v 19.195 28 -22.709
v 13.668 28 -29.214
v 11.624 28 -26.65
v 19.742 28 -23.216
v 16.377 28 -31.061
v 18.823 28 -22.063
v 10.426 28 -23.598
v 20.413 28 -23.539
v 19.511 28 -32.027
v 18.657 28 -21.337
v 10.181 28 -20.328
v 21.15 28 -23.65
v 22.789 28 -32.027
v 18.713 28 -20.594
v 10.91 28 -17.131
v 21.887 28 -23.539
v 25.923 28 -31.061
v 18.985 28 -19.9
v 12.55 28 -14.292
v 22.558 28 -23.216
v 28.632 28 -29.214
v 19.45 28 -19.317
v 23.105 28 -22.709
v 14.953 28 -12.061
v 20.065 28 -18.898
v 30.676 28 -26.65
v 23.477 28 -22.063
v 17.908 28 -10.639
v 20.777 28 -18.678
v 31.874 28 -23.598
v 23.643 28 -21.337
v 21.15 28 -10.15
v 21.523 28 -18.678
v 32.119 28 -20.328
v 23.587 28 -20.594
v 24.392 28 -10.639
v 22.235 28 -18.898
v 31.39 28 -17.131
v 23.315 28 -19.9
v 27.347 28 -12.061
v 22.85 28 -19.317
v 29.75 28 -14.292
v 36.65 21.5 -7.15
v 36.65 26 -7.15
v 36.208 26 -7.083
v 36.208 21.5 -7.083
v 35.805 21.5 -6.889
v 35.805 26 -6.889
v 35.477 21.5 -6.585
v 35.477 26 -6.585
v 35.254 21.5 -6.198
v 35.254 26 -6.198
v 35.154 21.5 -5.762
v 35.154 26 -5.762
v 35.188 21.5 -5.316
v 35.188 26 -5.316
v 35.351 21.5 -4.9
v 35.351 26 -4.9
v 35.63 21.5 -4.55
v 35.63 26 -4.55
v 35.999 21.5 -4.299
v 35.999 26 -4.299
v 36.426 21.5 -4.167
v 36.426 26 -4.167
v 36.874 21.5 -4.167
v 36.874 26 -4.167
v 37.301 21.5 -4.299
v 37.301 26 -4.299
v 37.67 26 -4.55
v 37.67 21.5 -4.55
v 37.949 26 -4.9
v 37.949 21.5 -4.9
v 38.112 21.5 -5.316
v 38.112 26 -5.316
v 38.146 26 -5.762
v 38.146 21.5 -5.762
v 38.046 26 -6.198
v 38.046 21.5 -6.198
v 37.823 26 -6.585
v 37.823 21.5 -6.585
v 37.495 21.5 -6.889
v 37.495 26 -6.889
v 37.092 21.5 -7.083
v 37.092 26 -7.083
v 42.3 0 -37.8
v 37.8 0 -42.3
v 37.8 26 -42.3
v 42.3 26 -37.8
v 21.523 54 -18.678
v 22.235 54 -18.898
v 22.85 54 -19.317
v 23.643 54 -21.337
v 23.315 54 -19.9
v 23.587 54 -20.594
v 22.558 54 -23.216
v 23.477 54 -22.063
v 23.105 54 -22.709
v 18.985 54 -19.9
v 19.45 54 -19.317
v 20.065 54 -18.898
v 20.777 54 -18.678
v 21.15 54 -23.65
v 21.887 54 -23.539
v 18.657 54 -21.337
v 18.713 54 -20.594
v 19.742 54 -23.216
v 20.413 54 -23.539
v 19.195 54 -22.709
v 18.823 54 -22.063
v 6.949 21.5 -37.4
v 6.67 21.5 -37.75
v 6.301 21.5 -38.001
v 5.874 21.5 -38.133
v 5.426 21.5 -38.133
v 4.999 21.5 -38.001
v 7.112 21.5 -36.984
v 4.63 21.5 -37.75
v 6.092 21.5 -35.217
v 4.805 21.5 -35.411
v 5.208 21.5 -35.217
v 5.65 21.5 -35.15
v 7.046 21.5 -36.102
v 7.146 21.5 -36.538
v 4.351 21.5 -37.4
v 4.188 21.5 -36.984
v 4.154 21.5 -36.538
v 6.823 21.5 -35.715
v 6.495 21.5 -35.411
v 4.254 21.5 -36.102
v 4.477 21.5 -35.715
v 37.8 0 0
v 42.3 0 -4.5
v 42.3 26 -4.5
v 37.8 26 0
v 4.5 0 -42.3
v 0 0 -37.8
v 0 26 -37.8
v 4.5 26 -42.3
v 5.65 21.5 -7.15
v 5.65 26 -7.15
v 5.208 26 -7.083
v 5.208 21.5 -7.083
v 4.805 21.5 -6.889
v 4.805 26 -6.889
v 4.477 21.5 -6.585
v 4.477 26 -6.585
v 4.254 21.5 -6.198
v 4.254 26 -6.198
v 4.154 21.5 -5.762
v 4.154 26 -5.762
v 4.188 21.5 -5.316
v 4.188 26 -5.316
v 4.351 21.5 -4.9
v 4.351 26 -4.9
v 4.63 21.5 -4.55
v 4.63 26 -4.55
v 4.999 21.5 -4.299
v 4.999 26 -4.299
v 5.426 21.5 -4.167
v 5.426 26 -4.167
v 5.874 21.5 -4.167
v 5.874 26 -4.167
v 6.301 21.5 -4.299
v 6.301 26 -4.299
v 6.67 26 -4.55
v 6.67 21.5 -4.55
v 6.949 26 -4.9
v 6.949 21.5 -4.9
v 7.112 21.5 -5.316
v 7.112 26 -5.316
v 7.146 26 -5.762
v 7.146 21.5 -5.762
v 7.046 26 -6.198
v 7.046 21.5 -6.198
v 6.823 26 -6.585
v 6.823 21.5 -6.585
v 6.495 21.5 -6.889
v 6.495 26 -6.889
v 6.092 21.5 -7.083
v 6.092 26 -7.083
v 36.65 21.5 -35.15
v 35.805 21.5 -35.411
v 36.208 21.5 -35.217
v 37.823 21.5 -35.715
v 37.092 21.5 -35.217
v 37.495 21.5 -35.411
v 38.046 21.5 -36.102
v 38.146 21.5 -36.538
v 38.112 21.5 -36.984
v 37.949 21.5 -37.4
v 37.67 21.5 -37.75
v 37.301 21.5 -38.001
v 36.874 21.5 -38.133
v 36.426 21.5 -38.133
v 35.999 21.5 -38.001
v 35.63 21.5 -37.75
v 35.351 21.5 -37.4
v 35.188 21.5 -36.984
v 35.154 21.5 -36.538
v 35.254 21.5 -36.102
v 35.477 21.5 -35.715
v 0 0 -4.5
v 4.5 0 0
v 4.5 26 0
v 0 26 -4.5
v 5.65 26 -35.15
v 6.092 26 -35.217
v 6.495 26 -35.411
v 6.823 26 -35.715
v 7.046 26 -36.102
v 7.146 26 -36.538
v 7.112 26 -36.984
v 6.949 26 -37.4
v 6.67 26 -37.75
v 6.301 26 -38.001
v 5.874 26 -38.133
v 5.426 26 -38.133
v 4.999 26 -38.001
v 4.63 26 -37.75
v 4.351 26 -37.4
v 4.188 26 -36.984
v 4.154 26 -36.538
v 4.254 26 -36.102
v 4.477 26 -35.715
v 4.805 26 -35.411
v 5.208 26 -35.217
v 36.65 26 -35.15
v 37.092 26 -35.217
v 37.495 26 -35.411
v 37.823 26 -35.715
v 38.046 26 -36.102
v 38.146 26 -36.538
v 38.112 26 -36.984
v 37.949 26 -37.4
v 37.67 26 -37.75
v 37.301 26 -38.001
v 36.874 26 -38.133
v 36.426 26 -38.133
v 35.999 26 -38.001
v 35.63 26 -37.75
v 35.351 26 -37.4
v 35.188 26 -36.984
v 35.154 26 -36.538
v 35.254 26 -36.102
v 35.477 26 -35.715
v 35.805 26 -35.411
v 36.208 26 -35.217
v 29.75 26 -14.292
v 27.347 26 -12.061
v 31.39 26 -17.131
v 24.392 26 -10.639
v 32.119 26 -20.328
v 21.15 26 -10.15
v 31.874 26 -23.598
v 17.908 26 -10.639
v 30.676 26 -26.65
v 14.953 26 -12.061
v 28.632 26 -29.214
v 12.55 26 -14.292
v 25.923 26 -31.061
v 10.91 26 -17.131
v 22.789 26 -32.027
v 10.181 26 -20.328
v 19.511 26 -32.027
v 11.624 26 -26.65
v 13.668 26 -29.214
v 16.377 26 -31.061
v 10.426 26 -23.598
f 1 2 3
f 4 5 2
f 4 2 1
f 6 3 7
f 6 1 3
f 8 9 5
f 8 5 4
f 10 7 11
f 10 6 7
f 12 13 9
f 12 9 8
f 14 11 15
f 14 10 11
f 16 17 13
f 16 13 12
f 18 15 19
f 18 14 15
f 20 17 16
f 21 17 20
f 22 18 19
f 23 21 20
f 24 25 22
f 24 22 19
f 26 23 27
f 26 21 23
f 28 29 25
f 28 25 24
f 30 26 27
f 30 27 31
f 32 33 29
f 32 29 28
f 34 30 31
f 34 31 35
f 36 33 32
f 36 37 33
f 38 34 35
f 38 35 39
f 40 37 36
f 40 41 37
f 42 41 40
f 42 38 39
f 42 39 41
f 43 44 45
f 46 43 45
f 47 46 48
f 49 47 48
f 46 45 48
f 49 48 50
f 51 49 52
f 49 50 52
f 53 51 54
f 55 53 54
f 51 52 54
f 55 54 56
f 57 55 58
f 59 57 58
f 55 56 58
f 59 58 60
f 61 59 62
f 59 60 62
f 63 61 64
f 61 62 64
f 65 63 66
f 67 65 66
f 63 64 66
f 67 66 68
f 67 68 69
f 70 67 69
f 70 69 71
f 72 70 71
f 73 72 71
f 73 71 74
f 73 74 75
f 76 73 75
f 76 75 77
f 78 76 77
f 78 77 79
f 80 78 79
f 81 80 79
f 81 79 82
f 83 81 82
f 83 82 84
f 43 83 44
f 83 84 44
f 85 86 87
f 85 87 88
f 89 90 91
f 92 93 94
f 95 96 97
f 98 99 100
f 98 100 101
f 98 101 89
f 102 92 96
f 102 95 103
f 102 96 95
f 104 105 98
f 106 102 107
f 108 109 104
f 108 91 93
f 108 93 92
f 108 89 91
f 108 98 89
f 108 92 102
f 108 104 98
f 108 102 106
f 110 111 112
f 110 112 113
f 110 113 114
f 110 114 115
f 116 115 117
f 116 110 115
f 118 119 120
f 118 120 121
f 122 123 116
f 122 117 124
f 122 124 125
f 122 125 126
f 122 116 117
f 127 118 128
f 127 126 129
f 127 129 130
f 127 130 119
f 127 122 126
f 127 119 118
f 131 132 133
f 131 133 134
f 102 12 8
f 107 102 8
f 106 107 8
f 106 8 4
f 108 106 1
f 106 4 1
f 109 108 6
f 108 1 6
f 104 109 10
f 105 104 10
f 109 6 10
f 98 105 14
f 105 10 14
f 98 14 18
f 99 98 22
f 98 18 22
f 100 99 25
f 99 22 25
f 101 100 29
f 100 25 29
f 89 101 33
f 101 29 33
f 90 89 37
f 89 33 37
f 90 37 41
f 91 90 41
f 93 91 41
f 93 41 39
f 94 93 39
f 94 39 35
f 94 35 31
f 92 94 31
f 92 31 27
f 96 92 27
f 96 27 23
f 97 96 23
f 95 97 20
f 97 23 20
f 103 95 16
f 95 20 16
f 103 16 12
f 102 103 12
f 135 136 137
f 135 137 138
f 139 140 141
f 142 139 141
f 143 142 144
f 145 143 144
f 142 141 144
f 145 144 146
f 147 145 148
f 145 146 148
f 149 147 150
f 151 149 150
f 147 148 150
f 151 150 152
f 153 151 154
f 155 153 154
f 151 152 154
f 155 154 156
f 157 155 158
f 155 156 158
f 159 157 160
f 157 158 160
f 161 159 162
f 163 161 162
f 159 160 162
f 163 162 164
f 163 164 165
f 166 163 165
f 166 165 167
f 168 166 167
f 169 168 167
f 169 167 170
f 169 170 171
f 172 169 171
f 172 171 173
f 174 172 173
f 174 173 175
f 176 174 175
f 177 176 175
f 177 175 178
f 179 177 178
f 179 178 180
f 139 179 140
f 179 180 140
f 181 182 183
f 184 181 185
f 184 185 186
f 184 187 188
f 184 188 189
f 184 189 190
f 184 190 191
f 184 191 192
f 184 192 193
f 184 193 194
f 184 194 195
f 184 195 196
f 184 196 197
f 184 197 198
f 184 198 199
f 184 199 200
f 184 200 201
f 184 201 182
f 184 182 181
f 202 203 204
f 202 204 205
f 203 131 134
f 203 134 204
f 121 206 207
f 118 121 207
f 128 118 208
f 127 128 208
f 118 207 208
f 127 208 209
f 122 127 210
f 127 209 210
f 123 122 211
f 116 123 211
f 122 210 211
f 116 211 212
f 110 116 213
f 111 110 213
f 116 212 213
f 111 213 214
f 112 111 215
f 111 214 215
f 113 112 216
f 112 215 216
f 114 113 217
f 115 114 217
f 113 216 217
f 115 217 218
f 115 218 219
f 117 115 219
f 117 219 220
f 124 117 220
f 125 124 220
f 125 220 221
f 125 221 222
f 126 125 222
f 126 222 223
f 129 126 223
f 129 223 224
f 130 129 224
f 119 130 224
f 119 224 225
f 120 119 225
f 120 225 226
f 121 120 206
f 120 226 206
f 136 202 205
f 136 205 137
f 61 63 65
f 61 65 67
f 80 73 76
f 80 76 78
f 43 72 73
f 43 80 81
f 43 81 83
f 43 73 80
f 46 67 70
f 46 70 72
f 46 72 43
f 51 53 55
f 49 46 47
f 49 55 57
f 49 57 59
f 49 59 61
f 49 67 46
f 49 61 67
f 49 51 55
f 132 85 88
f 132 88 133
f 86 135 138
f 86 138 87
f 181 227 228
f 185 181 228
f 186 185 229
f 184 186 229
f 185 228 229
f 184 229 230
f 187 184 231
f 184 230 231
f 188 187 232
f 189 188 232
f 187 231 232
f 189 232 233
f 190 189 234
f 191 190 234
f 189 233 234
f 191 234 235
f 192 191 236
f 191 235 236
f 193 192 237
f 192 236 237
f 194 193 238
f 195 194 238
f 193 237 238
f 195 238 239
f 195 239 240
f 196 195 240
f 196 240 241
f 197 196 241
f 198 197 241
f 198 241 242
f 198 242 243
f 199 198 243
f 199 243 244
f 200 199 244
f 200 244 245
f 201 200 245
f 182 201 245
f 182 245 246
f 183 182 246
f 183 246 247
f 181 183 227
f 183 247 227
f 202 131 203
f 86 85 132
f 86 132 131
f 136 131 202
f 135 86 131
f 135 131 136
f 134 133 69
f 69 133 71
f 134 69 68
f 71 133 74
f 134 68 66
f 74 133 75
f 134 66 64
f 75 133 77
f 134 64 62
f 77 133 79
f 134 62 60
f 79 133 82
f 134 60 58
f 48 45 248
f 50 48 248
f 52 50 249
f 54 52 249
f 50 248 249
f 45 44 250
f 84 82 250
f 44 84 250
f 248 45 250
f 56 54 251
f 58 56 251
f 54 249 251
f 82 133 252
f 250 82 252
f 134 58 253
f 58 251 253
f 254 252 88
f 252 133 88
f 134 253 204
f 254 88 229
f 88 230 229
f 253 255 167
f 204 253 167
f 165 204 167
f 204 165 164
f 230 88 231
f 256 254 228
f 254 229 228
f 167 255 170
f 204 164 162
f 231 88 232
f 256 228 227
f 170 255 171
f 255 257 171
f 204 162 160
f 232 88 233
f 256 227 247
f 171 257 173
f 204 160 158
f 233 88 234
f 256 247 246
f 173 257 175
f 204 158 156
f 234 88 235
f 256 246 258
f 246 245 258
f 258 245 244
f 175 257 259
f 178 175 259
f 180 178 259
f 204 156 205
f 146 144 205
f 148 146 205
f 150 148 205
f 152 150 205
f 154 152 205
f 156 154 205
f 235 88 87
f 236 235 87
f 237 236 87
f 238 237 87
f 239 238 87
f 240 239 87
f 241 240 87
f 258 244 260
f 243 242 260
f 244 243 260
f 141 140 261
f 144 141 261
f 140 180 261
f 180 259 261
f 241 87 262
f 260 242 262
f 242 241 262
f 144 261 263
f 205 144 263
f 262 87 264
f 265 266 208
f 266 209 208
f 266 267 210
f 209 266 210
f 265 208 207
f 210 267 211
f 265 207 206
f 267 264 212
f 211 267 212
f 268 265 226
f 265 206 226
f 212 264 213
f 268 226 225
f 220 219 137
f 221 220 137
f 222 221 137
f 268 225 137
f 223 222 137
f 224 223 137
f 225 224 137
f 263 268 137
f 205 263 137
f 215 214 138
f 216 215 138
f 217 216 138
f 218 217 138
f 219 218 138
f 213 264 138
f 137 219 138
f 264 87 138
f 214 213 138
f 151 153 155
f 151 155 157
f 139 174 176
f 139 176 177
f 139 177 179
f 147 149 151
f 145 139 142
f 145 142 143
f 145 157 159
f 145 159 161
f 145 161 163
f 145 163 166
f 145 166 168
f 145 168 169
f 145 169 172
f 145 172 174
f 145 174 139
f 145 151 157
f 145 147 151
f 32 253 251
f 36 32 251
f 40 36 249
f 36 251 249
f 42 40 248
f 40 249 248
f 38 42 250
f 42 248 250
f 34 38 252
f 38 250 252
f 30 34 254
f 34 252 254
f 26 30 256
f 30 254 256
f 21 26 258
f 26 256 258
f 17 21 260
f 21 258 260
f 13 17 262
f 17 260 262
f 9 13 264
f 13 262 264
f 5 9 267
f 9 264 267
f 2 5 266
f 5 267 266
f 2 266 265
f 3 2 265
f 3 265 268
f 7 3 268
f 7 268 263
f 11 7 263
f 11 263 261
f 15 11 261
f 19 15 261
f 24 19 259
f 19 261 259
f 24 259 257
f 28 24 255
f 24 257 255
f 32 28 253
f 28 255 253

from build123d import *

# Parameters (mm, degrees)
AUFSATZ_LINEAR_AUSTRAGEN1_DEPTH = 26
SKIZZE2_R                       = 11
AUFSATZ_LINEAR_AUSTRAGEN2_DEPTH = 2
SKIZZE3_R                       = 2.5
AUFSATZ_LINEAR_AUSTRAGEN3_DEPTH = 26
SKIZZE4_R                       = 1.5
SCHNITT_LINEAR_AUSTRAGEN1_DEPTH = 4.5


with BuildPart() as part:
    # Skizze1 → Aufsatz-Linear austragen1 (new body)
    with BuildSketch(Plane(origin=(0, 0, 0), x_dir=(1, 0, 0), z_dir=(0, 1, 0))):
        Polygon((0, 37.8), (4.5, 42.3), (37.8, 42.3), (42.3, 37.8), (42.3, 4.5), (37.8, 0), (4.5, 0), (0, 4.5), align=None)
    extrude(amount=AUFSATZ_LINEAR_AUSTRAGEN1_DEPTH)

    # Skizze2 → Aufsatz-Linear austragen2 (add)
    with BuildSketch(Plane(origin=(0, 26, 0), x_dir=(1, 0, 0), z_dir=(0, 1, 0))):
        with Locations(Location((21.15, 21.15, 0), (0, 0, 270))):
            Circle(SKIZZE2_R)
    extrude(amount=AUFSATZ_LINEAR_AUSTRAGEN2_DEPTH)

    # Skizze3 → Aufsatz-Linear austragen3 (add)
    with BuildSketch(Plane(origin=(0, 28, 0), x_dir=(1, 0, 0), z_dir=(0, 1, 0))):
        with Locations(Location((21.15, 21.15, 0), (0, 0, 90))):
            Circle(SKIZZE3_R)
    extrude(amount=AUFSATZ_LINEAR_AUSTRAGEN3_DEPTH)

    # Skizze4 → Schnitt-Linear austragen1 (cut)
    with BuildSketch(Plane(origin=(0, 26, 0), x_dir=(1, 0, 0), z_dir=(0, 1, 0))):
        with Locations(Location((5.65, 36.65, 0), (0, 0, 270))):
            Circle(SKIZZE4_R)
        with Locations(Location((36.65, 36.65, 0), (0, 0, 270))):
            Circle(SKIZZE4_R)
        with Locations(Location((5.65, 5.65, 0), (0, 0, 90))):
            Circle(SKIZZE4_R)
        with Locations(Location((36.65, 5.65, 0), (0, 0, 90))):
            Circle(SKIZZE4_R)
    extrude(amount=-SCHNITT_LINEAR_AUSTRAGEN1_DEPTH, mode=Mode.SUBTRACT)


solid = part.part
